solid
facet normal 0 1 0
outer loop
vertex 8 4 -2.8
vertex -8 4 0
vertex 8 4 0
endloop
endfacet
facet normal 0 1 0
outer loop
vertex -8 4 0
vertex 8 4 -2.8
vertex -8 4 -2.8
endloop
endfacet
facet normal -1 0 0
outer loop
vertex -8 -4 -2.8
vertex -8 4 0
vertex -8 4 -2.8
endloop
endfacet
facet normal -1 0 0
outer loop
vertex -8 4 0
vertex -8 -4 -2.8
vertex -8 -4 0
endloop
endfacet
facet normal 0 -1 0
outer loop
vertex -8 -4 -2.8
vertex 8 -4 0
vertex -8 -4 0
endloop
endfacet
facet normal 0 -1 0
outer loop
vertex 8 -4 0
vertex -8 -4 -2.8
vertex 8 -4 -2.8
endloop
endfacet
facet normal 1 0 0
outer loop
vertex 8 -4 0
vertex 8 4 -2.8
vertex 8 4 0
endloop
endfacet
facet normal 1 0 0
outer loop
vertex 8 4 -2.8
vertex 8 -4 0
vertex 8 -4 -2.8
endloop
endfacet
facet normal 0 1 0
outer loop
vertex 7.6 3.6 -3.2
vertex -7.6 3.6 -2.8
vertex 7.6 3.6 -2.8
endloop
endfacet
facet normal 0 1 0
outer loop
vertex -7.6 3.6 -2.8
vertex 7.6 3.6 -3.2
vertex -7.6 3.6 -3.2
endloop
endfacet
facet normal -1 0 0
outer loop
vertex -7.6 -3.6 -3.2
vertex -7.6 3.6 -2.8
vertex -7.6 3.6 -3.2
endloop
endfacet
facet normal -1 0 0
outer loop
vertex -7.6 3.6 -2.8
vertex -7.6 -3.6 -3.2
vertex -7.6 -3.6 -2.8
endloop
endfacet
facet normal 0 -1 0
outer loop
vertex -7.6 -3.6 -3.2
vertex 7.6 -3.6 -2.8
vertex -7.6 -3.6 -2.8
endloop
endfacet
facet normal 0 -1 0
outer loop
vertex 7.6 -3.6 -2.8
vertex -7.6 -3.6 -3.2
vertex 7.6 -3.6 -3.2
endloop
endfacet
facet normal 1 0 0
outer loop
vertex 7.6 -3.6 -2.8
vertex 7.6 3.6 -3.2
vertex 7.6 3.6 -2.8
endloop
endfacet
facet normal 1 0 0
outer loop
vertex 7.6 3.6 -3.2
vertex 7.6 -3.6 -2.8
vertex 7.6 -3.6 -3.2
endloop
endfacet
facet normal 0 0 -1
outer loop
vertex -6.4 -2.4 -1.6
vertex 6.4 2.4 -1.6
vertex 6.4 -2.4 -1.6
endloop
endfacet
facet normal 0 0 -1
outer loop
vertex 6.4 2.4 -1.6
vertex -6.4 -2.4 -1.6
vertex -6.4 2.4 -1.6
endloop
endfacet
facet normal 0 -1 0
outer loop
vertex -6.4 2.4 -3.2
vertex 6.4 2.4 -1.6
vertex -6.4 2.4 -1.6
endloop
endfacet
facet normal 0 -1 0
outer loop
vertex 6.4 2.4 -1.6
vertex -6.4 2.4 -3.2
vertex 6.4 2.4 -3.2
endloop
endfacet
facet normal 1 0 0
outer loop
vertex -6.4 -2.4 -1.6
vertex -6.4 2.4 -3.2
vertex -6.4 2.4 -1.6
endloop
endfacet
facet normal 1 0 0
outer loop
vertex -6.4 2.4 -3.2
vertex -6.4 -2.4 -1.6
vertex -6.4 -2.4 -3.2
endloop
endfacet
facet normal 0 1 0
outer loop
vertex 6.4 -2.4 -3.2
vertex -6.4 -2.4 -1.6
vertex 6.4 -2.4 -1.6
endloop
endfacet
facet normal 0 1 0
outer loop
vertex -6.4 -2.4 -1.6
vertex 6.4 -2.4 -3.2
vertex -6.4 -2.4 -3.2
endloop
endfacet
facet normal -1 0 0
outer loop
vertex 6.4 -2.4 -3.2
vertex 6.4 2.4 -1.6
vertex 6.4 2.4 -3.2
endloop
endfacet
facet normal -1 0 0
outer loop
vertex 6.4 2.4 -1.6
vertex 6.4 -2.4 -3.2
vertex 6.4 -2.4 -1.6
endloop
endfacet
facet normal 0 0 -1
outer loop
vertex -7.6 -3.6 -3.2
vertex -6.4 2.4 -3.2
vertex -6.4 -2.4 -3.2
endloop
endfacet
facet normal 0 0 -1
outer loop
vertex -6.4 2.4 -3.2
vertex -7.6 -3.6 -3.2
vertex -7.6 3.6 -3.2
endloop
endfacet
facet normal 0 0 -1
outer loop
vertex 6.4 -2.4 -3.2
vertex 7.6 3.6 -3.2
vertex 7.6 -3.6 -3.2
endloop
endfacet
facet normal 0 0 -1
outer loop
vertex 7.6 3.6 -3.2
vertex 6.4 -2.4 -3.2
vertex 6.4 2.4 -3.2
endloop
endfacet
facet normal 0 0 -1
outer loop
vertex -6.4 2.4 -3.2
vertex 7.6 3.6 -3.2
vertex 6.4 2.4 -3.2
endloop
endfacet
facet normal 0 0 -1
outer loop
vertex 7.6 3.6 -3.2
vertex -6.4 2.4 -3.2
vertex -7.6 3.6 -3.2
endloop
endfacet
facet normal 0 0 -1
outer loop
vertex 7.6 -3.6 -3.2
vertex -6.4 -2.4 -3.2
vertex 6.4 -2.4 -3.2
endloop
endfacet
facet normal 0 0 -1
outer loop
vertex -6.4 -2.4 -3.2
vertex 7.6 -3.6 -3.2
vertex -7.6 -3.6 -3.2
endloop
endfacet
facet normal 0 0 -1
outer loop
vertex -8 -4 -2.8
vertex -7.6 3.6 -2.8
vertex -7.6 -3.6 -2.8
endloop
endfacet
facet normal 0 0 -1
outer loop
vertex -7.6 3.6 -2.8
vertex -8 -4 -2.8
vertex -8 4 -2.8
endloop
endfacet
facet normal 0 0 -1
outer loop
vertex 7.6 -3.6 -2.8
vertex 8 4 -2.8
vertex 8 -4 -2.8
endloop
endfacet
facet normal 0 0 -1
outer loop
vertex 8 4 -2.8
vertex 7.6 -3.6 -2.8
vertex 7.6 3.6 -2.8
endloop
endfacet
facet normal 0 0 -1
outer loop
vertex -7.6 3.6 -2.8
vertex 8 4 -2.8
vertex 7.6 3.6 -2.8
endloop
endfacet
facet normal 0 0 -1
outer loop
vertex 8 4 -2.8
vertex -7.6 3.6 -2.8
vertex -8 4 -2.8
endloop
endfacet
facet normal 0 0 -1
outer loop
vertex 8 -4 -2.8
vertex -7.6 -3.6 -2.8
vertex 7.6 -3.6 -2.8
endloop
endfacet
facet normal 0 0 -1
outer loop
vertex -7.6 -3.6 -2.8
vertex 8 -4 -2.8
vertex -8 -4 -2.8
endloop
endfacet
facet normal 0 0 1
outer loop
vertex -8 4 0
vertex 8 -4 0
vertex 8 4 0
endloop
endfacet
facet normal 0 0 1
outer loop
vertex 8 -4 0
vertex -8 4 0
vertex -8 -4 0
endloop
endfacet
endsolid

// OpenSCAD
// file: ../p/box5.scad
use <../lib.scad>
function ldraw_lib__box5() = [
// 0 Box with 5 Faces and All Edges
// 0 Name: box5.dat
// 0 Author: James Jessiman
// 0 !LDRAW_ORG Primitive UPDATE 2012-01
// 0 !LICENSE Licensed under CC BY 2.0 and CC BY 4.0 : see CAreadme.txt
// 
// 0 BFC CERTIFY CCW
  [0,"BFC","CERTIFY"],
  [0,"BFC","CCW"],
// 
// 0 !HISTORY 2002-04-03 [sbliss] Modified for BFC compliance
// 0 !HISTORY 2002-04-25 [PTadmin] Official Update 2002-02
// 0 !HISTORY 2007-06-24 [PTadmin] Header formatted for Contributor Agreement
// 0 !HISTORY 2008-07-01 [PTadmin] Official Update 2008-01
// 0 !HISTORY 2012-02-16 [Philo] Changed to CCW
// 0 !HISTORY 2012-03-30 [PTadmin] Official Update 2012-01
// 
// 
// 2 24 1 1 1 -1 1 1
  [2,24,1,1,1,-1,1,1],
// 2 24 -1 1 1 -1 1 -1
  [2,24,-1,1,1,-1,1,-1],
// 2 24 -1 1 -1 1 1 -1
  [2,24,-1,1,-1,1,1,-1],
// 2 24 1 1 -1 1 1 1
  [2,24,1,1,-1,1,1,1],
// 2 24 1 0 1 -1 0 1
  [2,24,1,0,1,-1,0,1],
// 2 24 -1 0 1 -1 0 -1
  [2,24,-1,0,1,-1,0,-1],
// 2 24 -1 0 -1 1 0 -1
  [2,24,-1,0,-1,1,0,-1],
// 2 24 1 0 -1 1 0 1
  [2,24,1,0,-1,1,0,1],
// 2 24 1 0 1 1 1 1
  [2,24,1,0,1,1,1,1],
// 2 24 -1 0 1 -1 1 1
  [2,24,-1,0,1,-1,1,1],
// 2 24 1 0 -1 1 1 -1
  [2,24,1,0,-1,1,1,-1],
// 2 24 -1 0 -1 -1 1 -1
  [2,24,-1,0,-1,-1,1,-1],
// 4 16 -1 1 1 1 1 1 1 1 -1 -1 1 -1
  [4,16,-1,1,1,1,1,1,1,1,-1,-1,1,-1],
// 4 16 -1 1 1 -1 0 1 1 0 1 1 1 1
  [4,16,-1,1,1,-1,0,1,1,0,1,1,1,1],
// 4 16 -1 1 -1 -1 0 -1 -1 0 1 -1 1 1
  [4,16,-1,1,-1,-1,0,-1,-1,0,1,-1,1,1],
// 4 16 1 1 -1 1 0 -1 -1 0 -1 -1 1 -1
  [4,16,1,1,-1,1,0,-1,-1,0,-1,-1,1,-1],
// 4 16 1 1 1 1 0 1 1 0 -1 1 1 -1
  [4,16,1,1,1,1,0,1,1,0,-1,1,1,-1],
];
makepoly(ldraw_lib__box5(), line=0.2);
// file: ../p/box4.scad
use <../lib.scad>
function ldraw_lib__box4() = [
// 0 Box with 4 Faces (2 Parallel Pairs) and All Edges
// 0 Name: box4.dat
// 0 Author: James Jessiman
// 0 !LDRAW_ORG Primitive UPDATE 2012-01
// 0 !LICENSE Licensed under CC BY 2.0 and CC BY 4.0 : see CAreadme.txt
// 
// 0 BFC CERTIFY CCW
  [0,"BFC","CERTIFY"],
  [0,"BFC","CCW"],
// 
// 0 !HISTORY 2002-04-03 [sbliss] Modified for BFC compliance
// 0 !HISTORY 2002-04-25 [PTadmin] Official Update 2002-02
// 0 !HISTORY 2007-06-24 [PTadmin] Header formatted for Contributor Agreement
// 0 !HISTORY 2008-07-01 [PTadmin] Official Update 2008-01
// 0 !HISTORY 2012-02-16 [Philo] Changed to CCW
// 0 !HISTORY 2012-03-30 [PTadmin] Official Update 2012-01
// 
// 
// 2 24 1 1 1 -1 1 1
  [2,24,1,1,1,-1,1,1],
// 2 24 -1 1 1 -1 1 -1
  [2,24,-1,1,1,-1,1,-1],
// 2 24 -1 1 -1 1 1 -1
  [2,24,-1,1,-1,1,1,-1],
// 2 24 1 1 -1 1 1 1
  [2,24,1,1,-1,1,1,1],
// 2 24 1 0 1 -1 0 1
  [2,24,1,0,1,-1,0,1],
// 2 24 -1 0 1 -1 0 -1
  [2,24,-1,0,1,-1,0,-1],
// 2 24 -1 0 -1 1 0 -1
  [2,24,-1,0,-1,1,0,-1],
// 2 24 1 0 -1 1 0 1
  [2,24,1,0,-1,1,0,1],
// 2 24 1 0 1 1 1 1
  [2,24,1,0,1,1,1,1],
// 2 24 -1 0 1 -1 1 1
  [2,24,-1,0,1,-1,1,1],
// 2 24 1 0 -1 1 1 -1
  [2,24,1,0,-1,1,1,-1],
// 2 24 -1 0 -1 -1 1 -1
  [2,24,-1,0,-1,-1,1,-1],
// 4 16 -1 1 1 -1 0 1 1 0 1 1 1 1
  [4,16,-1,1,1,-1,0,1,1,0,1,1,1,1],
// 4 16 -1 1 -1 -1 0 -1 -1 0 1 -1 1 1
  [4,16,-1,1,-1,-1,0,-1,-1,0,1,-1,1,1],
// 4 16 1 1 -1 1 0 -1 -1 0 -1 -1 1 -1
  [4,16,1,1,-1,1,0,-1,-1,0,-1,-1,1,-1],
// 4 16 1 1 1 1 0 1 1 0 -1 1 1 -1
  [4,16,1,1,1,1,0,1,1,0,-1,1,1,-1],
];
makepoly(ldraw_lib__box4(), line=0.2);
// file: s/3069bs01.scad
use <../../lib.scad>
use <../../p/box4.scad>
use <../../p/box5.scad>
function ldraw_lib__s__3069bs01() = [
// 0 ~Tile  1 x  2 with Groove without Top Face
// 0 Name: s\3069bs01.dat
// 0 Author: Santeri Piippo [arezey]
// 0 !LDRAW_ORG Subpart UPDATE 2010-02
// 0 !LICENSE Licensed under CC BY 2.0 and CC BY 4.0 : see CAreadme.txt
// 
// 0 BFC CERTIFY CCW
  [0,"BFC","CERTIFY"],
  [0,"BFC","CCW"],
// 
// 0 !HISTORY 2010-07-05 [PTadmin] Official Update 2010-02
// 
// 
// 1 16 0 0 0 20 0 0 0 7 0 0 0 10 box4.dat
  [1,16,0,0,0,20,0,0,0,7,0,0,0,10, ldraw_lib__box4()],
// 1 16 0 7 0 19 0 0 0 1 0 0 0 9 box4.dat
  [1,16,0,7,0,19,0,0,0,1,0,0,0,9, ldraw_lib__box4()],
// 0 BFC INVERTNEXT
  [0,"BFC","INVERTNEXT"],
// 1 16 0 8 0 16 0 0 0 -4 0 0 0 6 box5.dat
  [1,16,0,8,0,16,0,0,0,-4,0,0,0,6, ldraw_lib__box5()],
// 4 16 -19 8 9 -16 8 6 -16 8 -6 -19 8 -9
  [4,16,-19,8,9,-16,8,6,-16,8,-6,-19,8,-9],
// 4 16 19 8 -9 16 8 -6 16 8 6 19 8 9
  [4,16,19,8,-9,16,8,-6,16,8,6,19,8,9],
// 4 16 19 8 9 16 8 6 -16 8 6 -19 8 9
  [4,16,19,8,9,16,8,6,-16,8,6,-19,8,9],
// 4 16 -19 8 -9 -16 8 -6 16 8 -6 19 8 -9
  [4,16,-19,8,-9,-16,8,-6,16,8,-6,19,8,-9],
// 4 16 -20 7 10 -19 7 9 -19 7 -9 -20 7 -10
  [4,16,-20,7,10,-19,7,9,-19,7,-9,-20,7,-10],
// 4 16 20 7 -10 19 7 -9 19 7 9 20 7 10
  [4,16,20,7,-10,19,7,-9,19,7,9,20,7,10],
// 4 16 20 7 10 19 7 9 -19 7 9 -20 7 10
  [4,16,20,7,10,19,7,9,-19,7,9,-20,7,10],
// 4 16 -20 7 -10 -19 7 -9 19 7 -9 20 7 -10
  [4,16,-20,7,-10,-19,7,-9,19,7,-9,20,7,-10],
// 0 //
];
makepoly(ldraw_lib__s__3069bs01(), line=0.2);
// main file
use <../lib.scad>
use <s/3069bs01.scad>
function ldraw_lib__3069bpf1() = [
// 0 Tile  1 x  2 with Red Top Pattern
// 0 Name: 3069bpf1.dat
// 0 Author: Niels Karsdorp [nielsk]
// 0 !LDRAW_ORG Part UPDATE 2004-03
// 0 !LICENSE Licensed under CC BY 2.0 and CC BY 4.0 : see CAreadme.txt
// 
// 0 BFC CERTIFY CCW
  [0,"BFC","CERTIFY"],
  [0,"BFC","CCW"],
// 
// 0 !HISTORY 2004-09-15 [PTadmin] Official Update 2004-03
// 0 !HISTORY 2007-06-13 [PTadmin] Header formatted for Contributor Agreement
// 0 !HISTORY 2008-07-01 [PTadmin] Official Update 2008-01
// 
// 
// 1 16 0 0 0 1 0 0 0 1 0 0 0 1 s\3069bs01.dat
  [1,16,0,0,0,1,0,0,0,1,0,0,0,1, ldraw_lib__s__3069bs01()],
// 4 4 -20 0 -10 20 0 -10 20 0 10 -20 0 10
  [4,4,-20,0,-10,20,0,-10,20,0,10,-20,0,10],
// 0
];
makepoly(ldraw_lib__3069bpf1(), line=0.2);
